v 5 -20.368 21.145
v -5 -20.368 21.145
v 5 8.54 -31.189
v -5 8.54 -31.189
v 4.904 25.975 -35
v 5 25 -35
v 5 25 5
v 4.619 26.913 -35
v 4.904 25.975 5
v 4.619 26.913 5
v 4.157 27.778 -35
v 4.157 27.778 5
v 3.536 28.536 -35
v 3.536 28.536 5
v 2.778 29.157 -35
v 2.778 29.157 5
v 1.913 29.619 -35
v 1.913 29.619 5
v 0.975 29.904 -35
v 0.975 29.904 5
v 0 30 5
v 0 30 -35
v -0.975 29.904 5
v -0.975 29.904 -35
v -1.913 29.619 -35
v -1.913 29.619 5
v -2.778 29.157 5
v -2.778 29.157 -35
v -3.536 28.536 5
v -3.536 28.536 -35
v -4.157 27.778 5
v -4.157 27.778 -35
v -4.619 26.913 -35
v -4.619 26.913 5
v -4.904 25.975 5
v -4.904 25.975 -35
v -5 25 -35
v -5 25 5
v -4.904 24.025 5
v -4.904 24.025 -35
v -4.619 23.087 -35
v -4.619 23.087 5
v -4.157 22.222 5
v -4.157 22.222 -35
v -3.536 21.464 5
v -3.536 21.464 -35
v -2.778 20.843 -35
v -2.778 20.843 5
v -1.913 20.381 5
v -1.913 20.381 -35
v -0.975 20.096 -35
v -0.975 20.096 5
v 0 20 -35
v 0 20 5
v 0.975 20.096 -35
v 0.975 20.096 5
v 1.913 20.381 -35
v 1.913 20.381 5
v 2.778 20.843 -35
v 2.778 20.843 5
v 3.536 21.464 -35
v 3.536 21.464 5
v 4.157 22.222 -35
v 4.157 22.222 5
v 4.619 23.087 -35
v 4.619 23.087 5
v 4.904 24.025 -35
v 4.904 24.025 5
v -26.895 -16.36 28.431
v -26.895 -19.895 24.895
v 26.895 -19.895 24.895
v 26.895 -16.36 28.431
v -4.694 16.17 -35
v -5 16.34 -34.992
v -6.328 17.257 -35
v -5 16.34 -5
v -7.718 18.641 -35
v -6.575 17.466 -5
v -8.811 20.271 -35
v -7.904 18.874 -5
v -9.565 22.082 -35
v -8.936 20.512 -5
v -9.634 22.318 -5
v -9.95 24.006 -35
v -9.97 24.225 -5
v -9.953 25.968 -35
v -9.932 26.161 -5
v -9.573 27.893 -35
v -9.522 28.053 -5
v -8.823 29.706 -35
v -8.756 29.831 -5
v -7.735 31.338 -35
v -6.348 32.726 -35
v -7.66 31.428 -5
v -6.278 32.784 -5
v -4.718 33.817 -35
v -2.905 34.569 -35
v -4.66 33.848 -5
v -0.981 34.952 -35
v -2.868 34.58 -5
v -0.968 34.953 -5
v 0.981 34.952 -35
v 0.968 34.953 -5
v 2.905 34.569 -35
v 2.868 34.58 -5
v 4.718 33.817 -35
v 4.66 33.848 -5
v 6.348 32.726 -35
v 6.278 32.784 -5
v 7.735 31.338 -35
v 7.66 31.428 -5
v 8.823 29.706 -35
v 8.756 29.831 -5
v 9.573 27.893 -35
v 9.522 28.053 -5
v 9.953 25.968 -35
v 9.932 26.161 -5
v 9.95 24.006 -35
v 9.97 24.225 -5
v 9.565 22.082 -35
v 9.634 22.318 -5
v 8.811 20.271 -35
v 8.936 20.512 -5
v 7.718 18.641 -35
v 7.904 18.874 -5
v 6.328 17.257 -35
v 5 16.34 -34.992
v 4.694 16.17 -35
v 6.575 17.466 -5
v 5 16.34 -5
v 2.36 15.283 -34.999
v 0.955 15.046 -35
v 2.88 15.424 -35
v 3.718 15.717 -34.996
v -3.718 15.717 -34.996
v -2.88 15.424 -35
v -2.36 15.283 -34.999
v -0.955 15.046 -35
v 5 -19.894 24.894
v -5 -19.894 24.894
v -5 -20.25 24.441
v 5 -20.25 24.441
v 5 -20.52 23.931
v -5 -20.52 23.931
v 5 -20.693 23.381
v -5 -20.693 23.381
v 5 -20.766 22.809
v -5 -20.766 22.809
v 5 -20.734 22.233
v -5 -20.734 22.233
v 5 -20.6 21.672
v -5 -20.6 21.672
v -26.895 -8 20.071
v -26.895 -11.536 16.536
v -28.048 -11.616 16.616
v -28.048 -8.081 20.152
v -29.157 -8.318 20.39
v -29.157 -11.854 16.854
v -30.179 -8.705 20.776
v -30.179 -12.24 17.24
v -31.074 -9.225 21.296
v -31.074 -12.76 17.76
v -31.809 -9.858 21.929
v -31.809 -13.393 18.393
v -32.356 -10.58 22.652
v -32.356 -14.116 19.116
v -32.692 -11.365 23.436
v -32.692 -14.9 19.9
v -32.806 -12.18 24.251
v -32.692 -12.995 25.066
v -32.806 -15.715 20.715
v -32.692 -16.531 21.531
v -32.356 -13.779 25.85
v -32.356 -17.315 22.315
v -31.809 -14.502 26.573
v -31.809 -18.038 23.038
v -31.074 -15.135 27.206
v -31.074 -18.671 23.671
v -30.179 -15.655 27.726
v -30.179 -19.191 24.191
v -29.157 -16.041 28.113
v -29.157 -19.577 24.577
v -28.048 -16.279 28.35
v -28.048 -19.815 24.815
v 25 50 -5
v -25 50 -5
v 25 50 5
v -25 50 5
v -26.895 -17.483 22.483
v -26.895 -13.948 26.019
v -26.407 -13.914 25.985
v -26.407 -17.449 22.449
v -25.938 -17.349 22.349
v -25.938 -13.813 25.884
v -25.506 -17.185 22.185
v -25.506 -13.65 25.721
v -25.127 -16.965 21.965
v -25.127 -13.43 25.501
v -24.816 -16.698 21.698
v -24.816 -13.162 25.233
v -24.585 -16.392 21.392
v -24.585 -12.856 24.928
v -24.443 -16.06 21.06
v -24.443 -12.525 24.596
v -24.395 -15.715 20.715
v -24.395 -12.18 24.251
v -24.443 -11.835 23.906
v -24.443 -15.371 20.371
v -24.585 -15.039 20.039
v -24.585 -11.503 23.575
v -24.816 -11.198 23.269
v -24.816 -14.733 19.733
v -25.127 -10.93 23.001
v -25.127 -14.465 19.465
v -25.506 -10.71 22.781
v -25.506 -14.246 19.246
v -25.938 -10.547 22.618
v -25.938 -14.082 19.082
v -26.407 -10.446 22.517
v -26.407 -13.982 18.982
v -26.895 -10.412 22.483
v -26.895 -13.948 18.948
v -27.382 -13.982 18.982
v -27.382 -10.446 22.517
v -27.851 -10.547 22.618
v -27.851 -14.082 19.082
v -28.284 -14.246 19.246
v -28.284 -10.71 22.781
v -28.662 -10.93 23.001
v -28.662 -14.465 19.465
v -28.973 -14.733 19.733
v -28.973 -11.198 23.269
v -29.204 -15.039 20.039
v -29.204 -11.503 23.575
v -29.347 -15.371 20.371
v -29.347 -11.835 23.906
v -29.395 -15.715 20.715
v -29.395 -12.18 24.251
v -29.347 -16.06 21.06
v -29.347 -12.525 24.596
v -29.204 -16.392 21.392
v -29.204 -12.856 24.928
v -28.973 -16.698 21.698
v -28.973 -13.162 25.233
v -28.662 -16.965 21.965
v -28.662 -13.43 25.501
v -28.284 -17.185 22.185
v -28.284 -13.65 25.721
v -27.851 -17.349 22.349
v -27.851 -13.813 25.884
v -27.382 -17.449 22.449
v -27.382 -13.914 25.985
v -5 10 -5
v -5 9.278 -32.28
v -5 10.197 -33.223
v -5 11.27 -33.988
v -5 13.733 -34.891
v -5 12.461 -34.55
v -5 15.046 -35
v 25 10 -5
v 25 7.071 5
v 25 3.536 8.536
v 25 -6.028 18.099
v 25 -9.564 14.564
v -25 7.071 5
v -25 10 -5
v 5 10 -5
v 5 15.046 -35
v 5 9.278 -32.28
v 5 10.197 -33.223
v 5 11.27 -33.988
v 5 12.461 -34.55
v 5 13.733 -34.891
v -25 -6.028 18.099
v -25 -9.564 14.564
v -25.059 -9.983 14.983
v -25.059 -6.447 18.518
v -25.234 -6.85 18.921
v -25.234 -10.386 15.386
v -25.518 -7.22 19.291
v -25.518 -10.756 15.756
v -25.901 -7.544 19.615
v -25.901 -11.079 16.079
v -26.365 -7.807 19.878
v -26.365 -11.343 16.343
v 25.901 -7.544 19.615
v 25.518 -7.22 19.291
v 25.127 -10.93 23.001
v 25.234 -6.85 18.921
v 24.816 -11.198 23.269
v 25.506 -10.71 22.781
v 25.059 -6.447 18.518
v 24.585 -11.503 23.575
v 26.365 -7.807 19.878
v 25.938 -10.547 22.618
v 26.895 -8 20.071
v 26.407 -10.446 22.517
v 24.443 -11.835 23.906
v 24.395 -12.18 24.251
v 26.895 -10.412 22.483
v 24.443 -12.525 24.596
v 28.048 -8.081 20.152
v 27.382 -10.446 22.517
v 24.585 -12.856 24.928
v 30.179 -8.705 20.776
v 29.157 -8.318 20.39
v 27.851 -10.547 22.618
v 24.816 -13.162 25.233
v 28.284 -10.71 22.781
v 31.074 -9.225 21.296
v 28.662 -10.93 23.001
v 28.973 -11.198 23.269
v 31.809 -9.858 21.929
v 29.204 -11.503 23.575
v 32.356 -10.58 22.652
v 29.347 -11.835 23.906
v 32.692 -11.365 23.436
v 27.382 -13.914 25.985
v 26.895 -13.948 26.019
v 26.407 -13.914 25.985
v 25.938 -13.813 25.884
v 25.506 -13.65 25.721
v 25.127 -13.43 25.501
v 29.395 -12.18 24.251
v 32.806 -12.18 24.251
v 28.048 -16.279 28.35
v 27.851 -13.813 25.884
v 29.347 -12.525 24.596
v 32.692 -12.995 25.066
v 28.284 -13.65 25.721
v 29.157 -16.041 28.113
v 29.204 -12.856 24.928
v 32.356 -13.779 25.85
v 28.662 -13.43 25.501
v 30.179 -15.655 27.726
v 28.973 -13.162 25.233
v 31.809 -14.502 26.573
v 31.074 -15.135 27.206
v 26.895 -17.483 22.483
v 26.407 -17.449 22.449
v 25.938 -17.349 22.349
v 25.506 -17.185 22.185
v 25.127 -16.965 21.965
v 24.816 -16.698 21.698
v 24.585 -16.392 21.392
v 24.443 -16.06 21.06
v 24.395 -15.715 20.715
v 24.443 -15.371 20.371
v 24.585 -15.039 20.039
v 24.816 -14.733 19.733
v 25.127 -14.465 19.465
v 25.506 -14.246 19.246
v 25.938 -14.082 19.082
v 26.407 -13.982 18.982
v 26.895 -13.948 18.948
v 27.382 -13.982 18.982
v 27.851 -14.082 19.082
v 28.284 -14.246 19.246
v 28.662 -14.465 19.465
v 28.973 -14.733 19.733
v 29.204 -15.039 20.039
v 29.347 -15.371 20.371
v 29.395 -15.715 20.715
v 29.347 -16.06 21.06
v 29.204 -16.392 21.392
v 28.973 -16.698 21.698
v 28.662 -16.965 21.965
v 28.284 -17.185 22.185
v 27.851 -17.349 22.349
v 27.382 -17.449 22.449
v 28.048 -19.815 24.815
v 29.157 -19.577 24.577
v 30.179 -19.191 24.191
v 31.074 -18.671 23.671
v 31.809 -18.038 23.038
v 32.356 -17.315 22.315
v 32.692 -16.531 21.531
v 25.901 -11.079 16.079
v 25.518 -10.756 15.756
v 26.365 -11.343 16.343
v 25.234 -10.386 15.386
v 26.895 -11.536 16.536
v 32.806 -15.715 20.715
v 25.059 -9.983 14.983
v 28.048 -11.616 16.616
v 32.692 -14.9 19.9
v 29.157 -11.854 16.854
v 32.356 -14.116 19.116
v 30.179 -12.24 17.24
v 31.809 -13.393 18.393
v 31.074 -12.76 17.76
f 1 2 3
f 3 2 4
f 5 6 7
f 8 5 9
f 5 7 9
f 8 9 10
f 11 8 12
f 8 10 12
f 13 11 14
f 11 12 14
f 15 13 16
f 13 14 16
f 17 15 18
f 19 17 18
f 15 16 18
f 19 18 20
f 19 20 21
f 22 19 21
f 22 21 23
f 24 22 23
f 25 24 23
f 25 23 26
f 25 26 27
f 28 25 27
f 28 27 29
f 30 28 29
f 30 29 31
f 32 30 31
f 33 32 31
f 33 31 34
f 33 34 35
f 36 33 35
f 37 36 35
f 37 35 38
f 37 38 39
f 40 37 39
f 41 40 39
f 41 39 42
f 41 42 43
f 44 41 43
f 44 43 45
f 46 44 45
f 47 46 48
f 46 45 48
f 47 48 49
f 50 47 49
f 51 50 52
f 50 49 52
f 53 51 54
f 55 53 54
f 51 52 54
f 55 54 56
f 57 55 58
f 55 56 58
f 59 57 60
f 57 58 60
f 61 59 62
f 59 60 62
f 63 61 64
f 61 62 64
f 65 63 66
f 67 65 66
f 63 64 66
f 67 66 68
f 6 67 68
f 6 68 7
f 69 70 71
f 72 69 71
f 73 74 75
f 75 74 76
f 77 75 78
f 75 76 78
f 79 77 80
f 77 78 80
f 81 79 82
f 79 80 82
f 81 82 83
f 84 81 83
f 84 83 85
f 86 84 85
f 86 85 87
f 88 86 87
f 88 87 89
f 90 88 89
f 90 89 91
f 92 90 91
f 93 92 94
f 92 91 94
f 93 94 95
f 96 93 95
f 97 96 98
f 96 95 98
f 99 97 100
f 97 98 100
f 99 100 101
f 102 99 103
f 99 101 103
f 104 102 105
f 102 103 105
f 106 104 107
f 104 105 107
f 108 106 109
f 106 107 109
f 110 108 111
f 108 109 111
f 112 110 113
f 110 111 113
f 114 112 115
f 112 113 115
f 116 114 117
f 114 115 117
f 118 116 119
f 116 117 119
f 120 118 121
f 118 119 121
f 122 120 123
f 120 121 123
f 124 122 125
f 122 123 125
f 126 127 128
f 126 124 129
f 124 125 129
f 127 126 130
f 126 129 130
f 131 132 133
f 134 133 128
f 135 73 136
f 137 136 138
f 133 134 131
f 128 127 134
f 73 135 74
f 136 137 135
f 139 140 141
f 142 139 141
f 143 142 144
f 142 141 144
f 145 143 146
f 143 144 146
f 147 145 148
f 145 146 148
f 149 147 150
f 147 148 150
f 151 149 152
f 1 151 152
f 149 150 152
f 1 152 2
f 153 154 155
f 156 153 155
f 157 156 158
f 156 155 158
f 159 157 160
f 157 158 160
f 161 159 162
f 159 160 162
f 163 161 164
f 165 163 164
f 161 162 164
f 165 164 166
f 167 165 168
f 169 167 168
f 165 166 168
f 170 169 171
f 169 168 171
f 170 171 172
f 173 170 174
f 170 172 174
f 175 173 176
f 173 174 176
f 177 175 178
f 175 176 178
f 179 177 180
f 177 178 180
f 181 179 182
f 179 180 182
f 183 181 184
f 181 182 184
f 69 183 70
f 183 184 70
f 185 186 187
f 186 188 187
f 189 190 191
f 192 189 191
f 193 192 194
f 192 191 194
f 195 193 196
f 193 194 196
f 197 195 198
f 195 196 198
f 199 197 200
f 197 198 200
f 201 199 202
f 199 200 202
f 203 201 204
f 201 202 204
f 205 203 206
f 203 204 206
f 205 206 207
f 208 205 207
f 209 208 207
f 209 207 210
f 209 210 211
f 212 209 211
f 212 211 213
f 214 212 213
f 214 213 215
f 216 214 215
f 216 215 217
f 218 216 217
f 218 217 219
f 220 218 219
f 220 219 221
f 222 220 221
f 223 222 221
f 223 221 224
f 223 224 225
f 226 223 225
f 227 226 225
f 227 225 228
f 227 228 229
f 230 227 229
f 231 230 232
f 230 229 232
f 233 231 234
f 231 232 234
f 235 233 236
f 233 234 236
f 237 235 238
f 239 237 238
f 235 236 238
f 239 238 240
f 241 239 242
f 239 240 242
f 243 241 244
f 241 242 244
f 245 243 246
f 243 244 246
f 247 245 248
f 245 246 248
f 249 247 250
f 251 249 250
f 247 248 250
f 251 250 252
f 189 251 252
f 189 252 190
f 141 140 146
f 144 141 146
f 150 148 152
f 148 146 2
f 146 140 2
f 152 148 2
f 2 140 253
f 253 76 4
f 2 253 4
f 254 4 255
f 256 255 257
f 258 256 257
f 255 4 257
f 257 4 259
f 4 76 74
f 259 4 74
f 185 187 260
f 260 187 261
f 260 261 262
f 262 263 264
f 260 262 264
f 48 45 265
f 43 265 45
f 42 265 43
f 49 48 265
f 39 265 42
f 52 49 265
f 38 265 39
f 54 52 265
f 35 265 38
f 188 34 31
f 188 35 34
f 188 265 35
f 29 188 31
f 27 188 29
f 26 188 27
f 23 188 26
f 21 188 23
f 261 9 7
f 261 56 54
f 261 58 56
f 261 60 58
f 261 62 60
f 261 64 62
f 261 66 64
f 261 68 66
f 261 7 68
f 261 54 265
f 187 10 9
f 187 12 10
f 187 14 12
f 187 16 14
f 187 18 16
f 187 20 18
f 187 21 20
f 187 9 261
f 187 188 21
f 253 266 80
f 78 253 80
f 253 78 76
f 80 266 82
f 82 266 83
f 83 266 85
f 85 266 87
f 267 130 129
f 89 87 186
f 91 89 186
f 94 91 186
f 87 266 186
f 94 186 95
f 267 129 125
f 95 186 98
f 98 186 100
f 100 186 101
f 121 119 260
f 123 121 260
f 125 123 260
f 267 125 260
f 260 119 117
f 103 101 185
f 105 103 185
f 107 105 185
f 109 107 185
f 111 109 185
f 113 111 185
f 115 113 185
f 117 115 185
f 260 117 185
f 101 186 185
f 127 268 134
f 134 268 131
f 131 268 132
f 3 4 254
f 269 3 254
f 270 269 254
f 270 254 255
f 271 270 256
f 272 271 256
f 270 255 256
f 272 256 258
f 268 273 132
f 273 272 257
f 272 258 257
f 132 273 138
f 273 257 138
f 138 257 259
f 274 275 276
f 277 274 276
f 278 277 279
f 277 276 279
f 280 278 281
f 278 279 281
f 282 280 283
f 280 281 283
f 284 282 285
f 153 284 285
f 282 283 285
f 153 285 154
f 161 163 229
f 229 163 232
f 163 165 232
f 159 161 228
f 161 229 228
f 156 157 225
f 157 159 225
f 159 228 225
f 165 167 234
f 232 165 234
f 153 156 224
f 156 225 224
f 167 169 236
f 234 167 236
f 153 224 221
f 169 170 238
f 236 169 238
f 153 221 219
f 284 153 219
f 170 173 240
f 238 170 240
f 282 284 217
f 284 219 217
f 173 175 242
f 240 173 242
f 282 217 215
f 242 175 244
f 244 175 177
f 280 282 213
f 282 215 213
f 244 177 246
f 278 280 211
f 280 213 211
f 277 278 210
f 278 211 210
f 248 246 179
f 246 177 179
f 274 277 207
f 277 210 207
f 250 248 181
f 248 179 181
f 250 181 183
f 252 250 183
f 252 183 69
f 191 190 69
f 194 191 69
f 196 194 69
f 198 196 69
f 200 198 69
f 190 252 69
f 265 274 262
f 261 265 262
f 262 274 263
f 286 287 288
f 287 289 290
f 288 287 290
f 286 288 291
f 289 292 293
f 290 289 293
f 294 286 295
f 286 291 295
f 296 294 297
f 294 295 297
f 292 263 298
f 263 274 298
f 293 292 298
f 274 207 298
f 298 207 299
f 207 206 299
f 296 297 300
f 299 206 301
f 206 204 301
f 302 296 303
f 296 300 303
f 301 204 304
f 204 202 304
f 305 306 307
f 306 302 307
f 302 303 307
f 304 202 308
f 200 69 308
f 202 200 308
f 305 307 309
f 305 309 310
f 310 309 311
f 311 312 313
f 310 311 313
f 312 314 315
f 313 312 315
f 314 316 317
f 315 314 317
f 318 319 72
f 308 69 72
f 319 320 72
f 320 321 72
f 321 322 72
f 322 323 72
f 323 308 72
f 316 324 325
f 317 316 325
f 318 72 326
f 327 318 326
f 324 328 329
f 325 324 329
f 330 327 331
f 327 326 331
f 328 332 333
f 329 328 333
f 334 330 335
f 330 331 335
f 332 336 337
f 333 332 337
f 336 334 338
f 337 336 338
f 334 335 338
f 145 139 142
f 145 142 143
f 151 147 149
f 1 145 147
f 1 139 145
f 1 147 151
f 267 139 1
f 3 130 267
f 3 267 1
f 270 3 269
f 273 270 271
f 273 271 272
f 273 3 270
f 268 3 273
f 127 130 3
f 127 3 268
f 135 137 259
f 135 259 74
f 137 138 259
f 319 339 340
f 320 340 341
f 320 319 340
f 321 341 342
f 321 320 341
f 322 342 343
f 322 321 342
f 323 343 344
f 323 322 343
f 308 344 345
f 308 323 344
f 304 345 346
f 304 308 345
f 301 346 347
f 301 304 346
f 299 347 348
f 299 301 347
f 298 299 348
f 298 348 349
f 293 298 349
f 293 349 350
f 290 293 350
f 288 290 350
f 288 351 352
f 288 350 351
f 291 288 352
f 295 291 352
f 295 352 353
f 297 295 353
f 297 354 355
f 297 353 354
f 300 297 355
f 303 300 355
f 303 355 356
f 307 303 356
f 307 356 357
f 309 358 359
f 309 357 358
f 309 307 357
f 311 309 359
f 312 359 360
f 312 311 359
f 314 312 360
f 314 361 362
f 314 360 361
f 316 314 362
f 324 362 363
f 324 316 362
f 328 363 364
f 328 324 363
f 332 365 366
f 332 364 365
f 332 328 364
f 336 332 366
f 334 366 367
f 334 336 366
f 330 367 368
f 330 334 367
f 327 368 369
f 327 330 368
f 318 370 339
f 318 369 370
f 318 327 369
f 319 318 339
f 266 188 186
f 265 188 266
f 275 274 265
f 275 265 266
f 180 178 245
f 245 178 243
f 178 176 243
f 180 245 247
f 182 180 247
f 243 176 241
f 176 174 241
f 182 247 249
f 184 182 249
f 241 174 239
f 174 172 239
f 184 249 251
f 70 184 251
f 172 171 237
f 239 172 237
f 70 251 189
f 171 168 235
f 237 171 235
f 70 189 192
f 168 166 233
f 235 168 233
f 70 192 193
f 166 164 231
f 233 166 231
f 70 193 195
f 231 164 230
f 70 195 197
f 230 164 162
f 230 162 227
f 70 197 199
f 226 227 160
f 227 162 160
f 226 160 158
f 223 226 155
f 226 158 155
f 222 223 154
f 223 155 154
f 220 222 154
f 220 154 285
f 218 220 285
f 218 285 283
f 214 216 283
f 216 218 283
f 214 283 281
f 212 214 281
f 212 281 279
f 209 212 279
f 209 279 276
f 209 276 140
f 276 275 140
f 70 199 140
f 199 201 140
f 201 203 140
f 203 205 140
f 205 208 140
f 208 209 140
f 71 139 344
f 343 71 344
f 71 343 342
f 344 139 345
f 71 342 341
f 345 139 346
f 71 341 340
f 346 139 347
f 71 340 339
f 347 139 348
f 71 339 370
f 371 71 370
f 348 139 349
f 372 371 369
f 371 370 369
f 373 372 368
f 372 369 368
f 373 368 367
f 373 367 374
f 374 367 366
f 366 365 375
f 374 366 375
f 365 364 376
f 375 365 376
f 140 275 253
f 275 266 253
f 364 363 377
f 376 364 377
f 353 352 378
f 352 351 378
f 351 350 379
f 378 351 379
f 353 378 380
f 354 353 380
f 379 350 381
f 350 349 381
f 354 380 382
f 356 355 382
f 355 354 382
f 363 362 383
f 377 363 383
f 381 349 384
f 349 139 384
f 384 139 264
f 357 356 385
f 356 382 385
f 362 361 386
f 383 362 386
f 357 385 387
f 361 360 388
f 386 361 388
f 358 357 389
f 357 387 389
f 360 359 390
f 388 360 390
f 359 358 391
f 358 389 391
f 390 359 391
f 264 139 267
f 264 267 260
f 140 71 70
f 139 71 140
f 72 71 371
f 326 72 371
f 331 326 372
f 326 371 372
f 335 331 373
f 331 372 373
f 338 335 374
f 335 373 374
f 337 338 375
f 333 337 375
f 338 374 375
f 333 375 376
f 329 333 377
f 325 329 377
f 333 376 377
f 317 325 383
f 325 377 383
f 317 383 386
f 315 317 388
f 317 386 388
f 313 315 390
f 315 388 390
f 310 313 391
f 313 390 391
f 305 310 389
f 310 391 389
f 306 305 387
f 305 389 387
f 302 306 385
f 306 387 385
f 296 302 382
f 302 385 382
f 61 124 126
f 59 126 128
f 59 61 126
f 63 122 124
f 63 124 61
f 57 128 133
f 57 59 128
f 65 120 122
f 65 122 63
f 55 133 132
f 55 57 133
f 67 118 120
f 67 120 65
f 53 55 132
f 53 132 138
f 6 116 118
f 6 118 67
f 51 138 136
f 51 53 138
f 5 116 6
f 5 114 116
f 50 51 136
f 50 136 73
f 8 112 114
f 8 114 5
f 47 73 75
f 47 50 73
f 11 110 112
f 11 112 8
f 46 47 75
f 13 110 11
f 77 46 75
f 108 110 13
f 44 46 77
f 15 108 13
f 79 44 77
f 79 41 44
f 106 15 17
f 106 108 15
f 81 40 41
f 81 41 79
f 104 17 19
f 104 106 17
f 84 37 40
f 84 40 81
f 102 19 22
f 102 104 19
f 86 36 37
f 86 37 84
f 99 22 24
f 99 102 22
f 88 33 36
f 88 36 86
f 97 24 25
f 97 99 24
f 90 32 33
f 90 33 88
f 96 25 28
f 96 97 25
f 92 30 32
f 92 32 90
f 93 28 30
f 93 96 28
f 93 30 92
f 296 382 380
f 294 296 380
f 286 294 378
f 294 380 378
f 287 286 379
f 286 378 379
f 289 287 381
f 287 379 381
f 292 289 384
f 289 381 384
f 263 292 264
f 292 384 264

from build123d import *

# Parameters (mm, degrees)
SCHIZZO1_W                   = 50
SCHIZZO1_H                   = 50
ESTRUSIONE_ESTRUSIONE1_DEPTH = 5
SCHIZZO2_R                   = 10
ESTRUSIONE_ESTRUSIONE2_DEPTH = 30
SCHIZZO3_R                   = 5
TAGLIO_ESTRUSIONE1_DEPTH     = 69.738635424
ESTRUSIONE_ESTRUSIONE6_DEPTH = 5
ESTRUSIONE_ESTRUSIONE7_REACH = 74.379
SCHIZZO9_W                   = 50
SCHIZZO9_H                   = 5
TAGLIO_ESTRUSIONE4_DEPTH     = 85.062355977
SCHIZZO12_R                  = 2.5
TAGLIO_ESTRUSIONE5_DEPTH     = 69.505418355
NERVATURA14_START            = -5
NERVATURA14_DEPTH            = 10


with BuildPart() as part:
    # Schizzo1 → Estrusione-Estrusione1 (new, symmetric)
    with BuildSketch(Plane.XY):
        with Locations((0, 25)):
            Rectangle(SCHIZZO1_W, SCHIZZO1_H)
    extrude(amount=ESTRUSIONE_ESTRUSIONE1_DEPTH, both=True)

    # Schizzo2 → Estrusione-Estrusione2 (add)
    with BuildSketch(Plane(origin=(0, 0, -5), x_dir=(-1, 0, 0), z_dir=(0, 0, -1))):
        with Locations((0, 25)):
            Circle(SCHIZZO2_R)
    extrude(amount=ESTRUSIONE_ESTRUSIONE2_DEPTH)

    # Schizzo3 → Taglio-Estrusione1 (cut, through all)
    with BuildSketch(Plane.XY.offset(5)):
        with Locations((0, 25)):
            Circle(SCHIZZO3_R)
    extrude(amount=-TAGLIO_ESTRUSIONE1_DEPTH, mode=Mode.SUBTRACT)

    # Estrusione-Estrusione7: up to this face of the body (flat: up to its plane)
    estrusione_estrusione7_end = Plane(part.part.faces().sort_by_distance((-24.292893219, 25, 5))[0])
    # Schizzo9 → Estrusione-Estrusione7 (add, up to the picked face)
    with BuildSketch(Plane(origin=(0, -2.5, 2.5), x_dir=(1, 0, 0), z_dir=(0, 0.7071067811865465, -0.7071067811865487)), mode=Mode.PRIVATE) as estrusione_estrusione7_sk1:
        with Locations((0, -6.035533906)):
            Rectangle(SCHIZZO9_W, SCHIZZO9_H)
    estrusione_estrusione7_tool1 = split(extrude(estrusione_estrusione7_sk1.sketch, amount=ESTRUSIONE_ESTRUSIONE7_REACH, mode=Mode.PRIVATE), bisect_by=estrusione_estrusione7_end, keep=Keep.BOTH, mode=Mode.PRIVATE)


with BuildPart() as body_2:
    # Schizzo4 → Estrusione-Estrusione6 (new body)
    with BuildSketch(Plane(origin=(0, 2.5, 2.5), x_dir=(1, 0, 0), z_dir=(0, 0.7071067811865488, 0.7071067811865464))):
        with BuildLine():
            ThreePointArc((-26.89463486, -19.849691999), (-32.805533406, -25.760590545), (-26.89463486, -31.67148909))
            Line((-26.89463486, -31.67148909), (0, -31.67148909))
            Line((0, -31.67148909), (0, -3.535533906))
            Line((0, -3.535533906), (-25, -3.535533906))
            Line((-25, -3.535533906), (-25, -17.060755301))
            ThreePointArc((-25, -17.060755301), (-25.518458602, -18.746564391), (-26.89463486, -19.849691999))
        make_face()
        with BuildLine():
            Line((0, -3.535533906), (0, -31.67148909))
            Line((0, -31.67148909), (26.89463486, -31.67148909))
            ThreePointArc((26.89463486, -31.67148909), (32.805533406, -25.760590545), (26.89463486, -19.849691999))
            ThreePointArc((26.89463486, -19.849691999), (25.518458602, -18.746564391), (25, -17.060755301))
            Line((25, -17.060755301), (25, -3.535533906))
            Line((25, -3.535533906), (0, -3.535533906))
        make_face()
    extrude(amount=ESTRUSIONE_ESTRUSIONE6_DEPTH)


with BuildPart() as part_1:
    add(part.part)

    add(body_2.part)  # Estrusione-Estrusione7 merges body 2
    add(estrusione_estrusione7_tool1.solids().sort_by(Axis((0, 1.767767, 6.767767), (0, 0.7071067811865465, -0.7071067811865487)))[0])

    # Schizzo11 → Taglio-Estrusione4 (cut, through all)
    with BuildSketch(Plane.ZY.offset(25)):
        Polygon((5, 0), (-5, 0), (-5, 10), align=None)
    extrude(amount=-TAGLIO_ESTRUSIONE4_DEPTH, mode=Mode.SUBTRACT)

    # Schizzo12 → Taglio-Estrusione5 (cut, through all)
    with BuildSketch(Plane(origin=(0, 6.035533906, 6.035533906), x_dir=(1, 0, 0), z_dir=(0, 0.7071067811865486, 0.7071067811865465))):
        with Locations(Location((-26.89463486, -25.760590545, 0), (0, 0, 270))):
            Circle(SCHIZZO12_R)
    taglio_estrusione5 = extrude(amount=-TAGLIO_ESTRUSIONE5_DEPTH, mode=Mode.SUBTRACT)

    # Specchia9: Taglio-Estrusione5 across plane
    add(taglio_estrusione5.mirror(Plane(origin=(0, 0, 0), x_dir=(0, 0, 1), z_dir=(1, 0, 0))), mode=Mode.SUBTRACT)

    # Nervatura14: read off the stored shape, not the designer's step
    # Nervatura14 outline → Nervatura14 (add)
    with BuildSketch(Plane(origin=(0, 0, 0), x_dir=(0, 0, -1), z_dir=(1, 0, 0)).offset(NERVATURA14_START)):
        with BuildLine():
            Line((35, 15.045679329), (34.991975911, 16.339745962))
            Line((34.991975911, 16.339745962), (5, 16.339745962))
            Line((5, 16.339745962), (5, 10))
            Line((5, 10), (-24.894153049, -19.894153049))
            ThreePointArc((-24.894153049, -19.894153049), (-23.096604523, -20.742423587), (-21.144530268, -20.368057844))
            Line((-21.144530268, -20.368057844), (31.188764864, 8.540341978))
            ThreePointArc((31.188764864, 8.540341978), (33.987865457, 11.269552189), (35, 15.045679329))
        make_face()
    extrude(amount=NERVATURA14_DEPTH)


solid = part_1.part
